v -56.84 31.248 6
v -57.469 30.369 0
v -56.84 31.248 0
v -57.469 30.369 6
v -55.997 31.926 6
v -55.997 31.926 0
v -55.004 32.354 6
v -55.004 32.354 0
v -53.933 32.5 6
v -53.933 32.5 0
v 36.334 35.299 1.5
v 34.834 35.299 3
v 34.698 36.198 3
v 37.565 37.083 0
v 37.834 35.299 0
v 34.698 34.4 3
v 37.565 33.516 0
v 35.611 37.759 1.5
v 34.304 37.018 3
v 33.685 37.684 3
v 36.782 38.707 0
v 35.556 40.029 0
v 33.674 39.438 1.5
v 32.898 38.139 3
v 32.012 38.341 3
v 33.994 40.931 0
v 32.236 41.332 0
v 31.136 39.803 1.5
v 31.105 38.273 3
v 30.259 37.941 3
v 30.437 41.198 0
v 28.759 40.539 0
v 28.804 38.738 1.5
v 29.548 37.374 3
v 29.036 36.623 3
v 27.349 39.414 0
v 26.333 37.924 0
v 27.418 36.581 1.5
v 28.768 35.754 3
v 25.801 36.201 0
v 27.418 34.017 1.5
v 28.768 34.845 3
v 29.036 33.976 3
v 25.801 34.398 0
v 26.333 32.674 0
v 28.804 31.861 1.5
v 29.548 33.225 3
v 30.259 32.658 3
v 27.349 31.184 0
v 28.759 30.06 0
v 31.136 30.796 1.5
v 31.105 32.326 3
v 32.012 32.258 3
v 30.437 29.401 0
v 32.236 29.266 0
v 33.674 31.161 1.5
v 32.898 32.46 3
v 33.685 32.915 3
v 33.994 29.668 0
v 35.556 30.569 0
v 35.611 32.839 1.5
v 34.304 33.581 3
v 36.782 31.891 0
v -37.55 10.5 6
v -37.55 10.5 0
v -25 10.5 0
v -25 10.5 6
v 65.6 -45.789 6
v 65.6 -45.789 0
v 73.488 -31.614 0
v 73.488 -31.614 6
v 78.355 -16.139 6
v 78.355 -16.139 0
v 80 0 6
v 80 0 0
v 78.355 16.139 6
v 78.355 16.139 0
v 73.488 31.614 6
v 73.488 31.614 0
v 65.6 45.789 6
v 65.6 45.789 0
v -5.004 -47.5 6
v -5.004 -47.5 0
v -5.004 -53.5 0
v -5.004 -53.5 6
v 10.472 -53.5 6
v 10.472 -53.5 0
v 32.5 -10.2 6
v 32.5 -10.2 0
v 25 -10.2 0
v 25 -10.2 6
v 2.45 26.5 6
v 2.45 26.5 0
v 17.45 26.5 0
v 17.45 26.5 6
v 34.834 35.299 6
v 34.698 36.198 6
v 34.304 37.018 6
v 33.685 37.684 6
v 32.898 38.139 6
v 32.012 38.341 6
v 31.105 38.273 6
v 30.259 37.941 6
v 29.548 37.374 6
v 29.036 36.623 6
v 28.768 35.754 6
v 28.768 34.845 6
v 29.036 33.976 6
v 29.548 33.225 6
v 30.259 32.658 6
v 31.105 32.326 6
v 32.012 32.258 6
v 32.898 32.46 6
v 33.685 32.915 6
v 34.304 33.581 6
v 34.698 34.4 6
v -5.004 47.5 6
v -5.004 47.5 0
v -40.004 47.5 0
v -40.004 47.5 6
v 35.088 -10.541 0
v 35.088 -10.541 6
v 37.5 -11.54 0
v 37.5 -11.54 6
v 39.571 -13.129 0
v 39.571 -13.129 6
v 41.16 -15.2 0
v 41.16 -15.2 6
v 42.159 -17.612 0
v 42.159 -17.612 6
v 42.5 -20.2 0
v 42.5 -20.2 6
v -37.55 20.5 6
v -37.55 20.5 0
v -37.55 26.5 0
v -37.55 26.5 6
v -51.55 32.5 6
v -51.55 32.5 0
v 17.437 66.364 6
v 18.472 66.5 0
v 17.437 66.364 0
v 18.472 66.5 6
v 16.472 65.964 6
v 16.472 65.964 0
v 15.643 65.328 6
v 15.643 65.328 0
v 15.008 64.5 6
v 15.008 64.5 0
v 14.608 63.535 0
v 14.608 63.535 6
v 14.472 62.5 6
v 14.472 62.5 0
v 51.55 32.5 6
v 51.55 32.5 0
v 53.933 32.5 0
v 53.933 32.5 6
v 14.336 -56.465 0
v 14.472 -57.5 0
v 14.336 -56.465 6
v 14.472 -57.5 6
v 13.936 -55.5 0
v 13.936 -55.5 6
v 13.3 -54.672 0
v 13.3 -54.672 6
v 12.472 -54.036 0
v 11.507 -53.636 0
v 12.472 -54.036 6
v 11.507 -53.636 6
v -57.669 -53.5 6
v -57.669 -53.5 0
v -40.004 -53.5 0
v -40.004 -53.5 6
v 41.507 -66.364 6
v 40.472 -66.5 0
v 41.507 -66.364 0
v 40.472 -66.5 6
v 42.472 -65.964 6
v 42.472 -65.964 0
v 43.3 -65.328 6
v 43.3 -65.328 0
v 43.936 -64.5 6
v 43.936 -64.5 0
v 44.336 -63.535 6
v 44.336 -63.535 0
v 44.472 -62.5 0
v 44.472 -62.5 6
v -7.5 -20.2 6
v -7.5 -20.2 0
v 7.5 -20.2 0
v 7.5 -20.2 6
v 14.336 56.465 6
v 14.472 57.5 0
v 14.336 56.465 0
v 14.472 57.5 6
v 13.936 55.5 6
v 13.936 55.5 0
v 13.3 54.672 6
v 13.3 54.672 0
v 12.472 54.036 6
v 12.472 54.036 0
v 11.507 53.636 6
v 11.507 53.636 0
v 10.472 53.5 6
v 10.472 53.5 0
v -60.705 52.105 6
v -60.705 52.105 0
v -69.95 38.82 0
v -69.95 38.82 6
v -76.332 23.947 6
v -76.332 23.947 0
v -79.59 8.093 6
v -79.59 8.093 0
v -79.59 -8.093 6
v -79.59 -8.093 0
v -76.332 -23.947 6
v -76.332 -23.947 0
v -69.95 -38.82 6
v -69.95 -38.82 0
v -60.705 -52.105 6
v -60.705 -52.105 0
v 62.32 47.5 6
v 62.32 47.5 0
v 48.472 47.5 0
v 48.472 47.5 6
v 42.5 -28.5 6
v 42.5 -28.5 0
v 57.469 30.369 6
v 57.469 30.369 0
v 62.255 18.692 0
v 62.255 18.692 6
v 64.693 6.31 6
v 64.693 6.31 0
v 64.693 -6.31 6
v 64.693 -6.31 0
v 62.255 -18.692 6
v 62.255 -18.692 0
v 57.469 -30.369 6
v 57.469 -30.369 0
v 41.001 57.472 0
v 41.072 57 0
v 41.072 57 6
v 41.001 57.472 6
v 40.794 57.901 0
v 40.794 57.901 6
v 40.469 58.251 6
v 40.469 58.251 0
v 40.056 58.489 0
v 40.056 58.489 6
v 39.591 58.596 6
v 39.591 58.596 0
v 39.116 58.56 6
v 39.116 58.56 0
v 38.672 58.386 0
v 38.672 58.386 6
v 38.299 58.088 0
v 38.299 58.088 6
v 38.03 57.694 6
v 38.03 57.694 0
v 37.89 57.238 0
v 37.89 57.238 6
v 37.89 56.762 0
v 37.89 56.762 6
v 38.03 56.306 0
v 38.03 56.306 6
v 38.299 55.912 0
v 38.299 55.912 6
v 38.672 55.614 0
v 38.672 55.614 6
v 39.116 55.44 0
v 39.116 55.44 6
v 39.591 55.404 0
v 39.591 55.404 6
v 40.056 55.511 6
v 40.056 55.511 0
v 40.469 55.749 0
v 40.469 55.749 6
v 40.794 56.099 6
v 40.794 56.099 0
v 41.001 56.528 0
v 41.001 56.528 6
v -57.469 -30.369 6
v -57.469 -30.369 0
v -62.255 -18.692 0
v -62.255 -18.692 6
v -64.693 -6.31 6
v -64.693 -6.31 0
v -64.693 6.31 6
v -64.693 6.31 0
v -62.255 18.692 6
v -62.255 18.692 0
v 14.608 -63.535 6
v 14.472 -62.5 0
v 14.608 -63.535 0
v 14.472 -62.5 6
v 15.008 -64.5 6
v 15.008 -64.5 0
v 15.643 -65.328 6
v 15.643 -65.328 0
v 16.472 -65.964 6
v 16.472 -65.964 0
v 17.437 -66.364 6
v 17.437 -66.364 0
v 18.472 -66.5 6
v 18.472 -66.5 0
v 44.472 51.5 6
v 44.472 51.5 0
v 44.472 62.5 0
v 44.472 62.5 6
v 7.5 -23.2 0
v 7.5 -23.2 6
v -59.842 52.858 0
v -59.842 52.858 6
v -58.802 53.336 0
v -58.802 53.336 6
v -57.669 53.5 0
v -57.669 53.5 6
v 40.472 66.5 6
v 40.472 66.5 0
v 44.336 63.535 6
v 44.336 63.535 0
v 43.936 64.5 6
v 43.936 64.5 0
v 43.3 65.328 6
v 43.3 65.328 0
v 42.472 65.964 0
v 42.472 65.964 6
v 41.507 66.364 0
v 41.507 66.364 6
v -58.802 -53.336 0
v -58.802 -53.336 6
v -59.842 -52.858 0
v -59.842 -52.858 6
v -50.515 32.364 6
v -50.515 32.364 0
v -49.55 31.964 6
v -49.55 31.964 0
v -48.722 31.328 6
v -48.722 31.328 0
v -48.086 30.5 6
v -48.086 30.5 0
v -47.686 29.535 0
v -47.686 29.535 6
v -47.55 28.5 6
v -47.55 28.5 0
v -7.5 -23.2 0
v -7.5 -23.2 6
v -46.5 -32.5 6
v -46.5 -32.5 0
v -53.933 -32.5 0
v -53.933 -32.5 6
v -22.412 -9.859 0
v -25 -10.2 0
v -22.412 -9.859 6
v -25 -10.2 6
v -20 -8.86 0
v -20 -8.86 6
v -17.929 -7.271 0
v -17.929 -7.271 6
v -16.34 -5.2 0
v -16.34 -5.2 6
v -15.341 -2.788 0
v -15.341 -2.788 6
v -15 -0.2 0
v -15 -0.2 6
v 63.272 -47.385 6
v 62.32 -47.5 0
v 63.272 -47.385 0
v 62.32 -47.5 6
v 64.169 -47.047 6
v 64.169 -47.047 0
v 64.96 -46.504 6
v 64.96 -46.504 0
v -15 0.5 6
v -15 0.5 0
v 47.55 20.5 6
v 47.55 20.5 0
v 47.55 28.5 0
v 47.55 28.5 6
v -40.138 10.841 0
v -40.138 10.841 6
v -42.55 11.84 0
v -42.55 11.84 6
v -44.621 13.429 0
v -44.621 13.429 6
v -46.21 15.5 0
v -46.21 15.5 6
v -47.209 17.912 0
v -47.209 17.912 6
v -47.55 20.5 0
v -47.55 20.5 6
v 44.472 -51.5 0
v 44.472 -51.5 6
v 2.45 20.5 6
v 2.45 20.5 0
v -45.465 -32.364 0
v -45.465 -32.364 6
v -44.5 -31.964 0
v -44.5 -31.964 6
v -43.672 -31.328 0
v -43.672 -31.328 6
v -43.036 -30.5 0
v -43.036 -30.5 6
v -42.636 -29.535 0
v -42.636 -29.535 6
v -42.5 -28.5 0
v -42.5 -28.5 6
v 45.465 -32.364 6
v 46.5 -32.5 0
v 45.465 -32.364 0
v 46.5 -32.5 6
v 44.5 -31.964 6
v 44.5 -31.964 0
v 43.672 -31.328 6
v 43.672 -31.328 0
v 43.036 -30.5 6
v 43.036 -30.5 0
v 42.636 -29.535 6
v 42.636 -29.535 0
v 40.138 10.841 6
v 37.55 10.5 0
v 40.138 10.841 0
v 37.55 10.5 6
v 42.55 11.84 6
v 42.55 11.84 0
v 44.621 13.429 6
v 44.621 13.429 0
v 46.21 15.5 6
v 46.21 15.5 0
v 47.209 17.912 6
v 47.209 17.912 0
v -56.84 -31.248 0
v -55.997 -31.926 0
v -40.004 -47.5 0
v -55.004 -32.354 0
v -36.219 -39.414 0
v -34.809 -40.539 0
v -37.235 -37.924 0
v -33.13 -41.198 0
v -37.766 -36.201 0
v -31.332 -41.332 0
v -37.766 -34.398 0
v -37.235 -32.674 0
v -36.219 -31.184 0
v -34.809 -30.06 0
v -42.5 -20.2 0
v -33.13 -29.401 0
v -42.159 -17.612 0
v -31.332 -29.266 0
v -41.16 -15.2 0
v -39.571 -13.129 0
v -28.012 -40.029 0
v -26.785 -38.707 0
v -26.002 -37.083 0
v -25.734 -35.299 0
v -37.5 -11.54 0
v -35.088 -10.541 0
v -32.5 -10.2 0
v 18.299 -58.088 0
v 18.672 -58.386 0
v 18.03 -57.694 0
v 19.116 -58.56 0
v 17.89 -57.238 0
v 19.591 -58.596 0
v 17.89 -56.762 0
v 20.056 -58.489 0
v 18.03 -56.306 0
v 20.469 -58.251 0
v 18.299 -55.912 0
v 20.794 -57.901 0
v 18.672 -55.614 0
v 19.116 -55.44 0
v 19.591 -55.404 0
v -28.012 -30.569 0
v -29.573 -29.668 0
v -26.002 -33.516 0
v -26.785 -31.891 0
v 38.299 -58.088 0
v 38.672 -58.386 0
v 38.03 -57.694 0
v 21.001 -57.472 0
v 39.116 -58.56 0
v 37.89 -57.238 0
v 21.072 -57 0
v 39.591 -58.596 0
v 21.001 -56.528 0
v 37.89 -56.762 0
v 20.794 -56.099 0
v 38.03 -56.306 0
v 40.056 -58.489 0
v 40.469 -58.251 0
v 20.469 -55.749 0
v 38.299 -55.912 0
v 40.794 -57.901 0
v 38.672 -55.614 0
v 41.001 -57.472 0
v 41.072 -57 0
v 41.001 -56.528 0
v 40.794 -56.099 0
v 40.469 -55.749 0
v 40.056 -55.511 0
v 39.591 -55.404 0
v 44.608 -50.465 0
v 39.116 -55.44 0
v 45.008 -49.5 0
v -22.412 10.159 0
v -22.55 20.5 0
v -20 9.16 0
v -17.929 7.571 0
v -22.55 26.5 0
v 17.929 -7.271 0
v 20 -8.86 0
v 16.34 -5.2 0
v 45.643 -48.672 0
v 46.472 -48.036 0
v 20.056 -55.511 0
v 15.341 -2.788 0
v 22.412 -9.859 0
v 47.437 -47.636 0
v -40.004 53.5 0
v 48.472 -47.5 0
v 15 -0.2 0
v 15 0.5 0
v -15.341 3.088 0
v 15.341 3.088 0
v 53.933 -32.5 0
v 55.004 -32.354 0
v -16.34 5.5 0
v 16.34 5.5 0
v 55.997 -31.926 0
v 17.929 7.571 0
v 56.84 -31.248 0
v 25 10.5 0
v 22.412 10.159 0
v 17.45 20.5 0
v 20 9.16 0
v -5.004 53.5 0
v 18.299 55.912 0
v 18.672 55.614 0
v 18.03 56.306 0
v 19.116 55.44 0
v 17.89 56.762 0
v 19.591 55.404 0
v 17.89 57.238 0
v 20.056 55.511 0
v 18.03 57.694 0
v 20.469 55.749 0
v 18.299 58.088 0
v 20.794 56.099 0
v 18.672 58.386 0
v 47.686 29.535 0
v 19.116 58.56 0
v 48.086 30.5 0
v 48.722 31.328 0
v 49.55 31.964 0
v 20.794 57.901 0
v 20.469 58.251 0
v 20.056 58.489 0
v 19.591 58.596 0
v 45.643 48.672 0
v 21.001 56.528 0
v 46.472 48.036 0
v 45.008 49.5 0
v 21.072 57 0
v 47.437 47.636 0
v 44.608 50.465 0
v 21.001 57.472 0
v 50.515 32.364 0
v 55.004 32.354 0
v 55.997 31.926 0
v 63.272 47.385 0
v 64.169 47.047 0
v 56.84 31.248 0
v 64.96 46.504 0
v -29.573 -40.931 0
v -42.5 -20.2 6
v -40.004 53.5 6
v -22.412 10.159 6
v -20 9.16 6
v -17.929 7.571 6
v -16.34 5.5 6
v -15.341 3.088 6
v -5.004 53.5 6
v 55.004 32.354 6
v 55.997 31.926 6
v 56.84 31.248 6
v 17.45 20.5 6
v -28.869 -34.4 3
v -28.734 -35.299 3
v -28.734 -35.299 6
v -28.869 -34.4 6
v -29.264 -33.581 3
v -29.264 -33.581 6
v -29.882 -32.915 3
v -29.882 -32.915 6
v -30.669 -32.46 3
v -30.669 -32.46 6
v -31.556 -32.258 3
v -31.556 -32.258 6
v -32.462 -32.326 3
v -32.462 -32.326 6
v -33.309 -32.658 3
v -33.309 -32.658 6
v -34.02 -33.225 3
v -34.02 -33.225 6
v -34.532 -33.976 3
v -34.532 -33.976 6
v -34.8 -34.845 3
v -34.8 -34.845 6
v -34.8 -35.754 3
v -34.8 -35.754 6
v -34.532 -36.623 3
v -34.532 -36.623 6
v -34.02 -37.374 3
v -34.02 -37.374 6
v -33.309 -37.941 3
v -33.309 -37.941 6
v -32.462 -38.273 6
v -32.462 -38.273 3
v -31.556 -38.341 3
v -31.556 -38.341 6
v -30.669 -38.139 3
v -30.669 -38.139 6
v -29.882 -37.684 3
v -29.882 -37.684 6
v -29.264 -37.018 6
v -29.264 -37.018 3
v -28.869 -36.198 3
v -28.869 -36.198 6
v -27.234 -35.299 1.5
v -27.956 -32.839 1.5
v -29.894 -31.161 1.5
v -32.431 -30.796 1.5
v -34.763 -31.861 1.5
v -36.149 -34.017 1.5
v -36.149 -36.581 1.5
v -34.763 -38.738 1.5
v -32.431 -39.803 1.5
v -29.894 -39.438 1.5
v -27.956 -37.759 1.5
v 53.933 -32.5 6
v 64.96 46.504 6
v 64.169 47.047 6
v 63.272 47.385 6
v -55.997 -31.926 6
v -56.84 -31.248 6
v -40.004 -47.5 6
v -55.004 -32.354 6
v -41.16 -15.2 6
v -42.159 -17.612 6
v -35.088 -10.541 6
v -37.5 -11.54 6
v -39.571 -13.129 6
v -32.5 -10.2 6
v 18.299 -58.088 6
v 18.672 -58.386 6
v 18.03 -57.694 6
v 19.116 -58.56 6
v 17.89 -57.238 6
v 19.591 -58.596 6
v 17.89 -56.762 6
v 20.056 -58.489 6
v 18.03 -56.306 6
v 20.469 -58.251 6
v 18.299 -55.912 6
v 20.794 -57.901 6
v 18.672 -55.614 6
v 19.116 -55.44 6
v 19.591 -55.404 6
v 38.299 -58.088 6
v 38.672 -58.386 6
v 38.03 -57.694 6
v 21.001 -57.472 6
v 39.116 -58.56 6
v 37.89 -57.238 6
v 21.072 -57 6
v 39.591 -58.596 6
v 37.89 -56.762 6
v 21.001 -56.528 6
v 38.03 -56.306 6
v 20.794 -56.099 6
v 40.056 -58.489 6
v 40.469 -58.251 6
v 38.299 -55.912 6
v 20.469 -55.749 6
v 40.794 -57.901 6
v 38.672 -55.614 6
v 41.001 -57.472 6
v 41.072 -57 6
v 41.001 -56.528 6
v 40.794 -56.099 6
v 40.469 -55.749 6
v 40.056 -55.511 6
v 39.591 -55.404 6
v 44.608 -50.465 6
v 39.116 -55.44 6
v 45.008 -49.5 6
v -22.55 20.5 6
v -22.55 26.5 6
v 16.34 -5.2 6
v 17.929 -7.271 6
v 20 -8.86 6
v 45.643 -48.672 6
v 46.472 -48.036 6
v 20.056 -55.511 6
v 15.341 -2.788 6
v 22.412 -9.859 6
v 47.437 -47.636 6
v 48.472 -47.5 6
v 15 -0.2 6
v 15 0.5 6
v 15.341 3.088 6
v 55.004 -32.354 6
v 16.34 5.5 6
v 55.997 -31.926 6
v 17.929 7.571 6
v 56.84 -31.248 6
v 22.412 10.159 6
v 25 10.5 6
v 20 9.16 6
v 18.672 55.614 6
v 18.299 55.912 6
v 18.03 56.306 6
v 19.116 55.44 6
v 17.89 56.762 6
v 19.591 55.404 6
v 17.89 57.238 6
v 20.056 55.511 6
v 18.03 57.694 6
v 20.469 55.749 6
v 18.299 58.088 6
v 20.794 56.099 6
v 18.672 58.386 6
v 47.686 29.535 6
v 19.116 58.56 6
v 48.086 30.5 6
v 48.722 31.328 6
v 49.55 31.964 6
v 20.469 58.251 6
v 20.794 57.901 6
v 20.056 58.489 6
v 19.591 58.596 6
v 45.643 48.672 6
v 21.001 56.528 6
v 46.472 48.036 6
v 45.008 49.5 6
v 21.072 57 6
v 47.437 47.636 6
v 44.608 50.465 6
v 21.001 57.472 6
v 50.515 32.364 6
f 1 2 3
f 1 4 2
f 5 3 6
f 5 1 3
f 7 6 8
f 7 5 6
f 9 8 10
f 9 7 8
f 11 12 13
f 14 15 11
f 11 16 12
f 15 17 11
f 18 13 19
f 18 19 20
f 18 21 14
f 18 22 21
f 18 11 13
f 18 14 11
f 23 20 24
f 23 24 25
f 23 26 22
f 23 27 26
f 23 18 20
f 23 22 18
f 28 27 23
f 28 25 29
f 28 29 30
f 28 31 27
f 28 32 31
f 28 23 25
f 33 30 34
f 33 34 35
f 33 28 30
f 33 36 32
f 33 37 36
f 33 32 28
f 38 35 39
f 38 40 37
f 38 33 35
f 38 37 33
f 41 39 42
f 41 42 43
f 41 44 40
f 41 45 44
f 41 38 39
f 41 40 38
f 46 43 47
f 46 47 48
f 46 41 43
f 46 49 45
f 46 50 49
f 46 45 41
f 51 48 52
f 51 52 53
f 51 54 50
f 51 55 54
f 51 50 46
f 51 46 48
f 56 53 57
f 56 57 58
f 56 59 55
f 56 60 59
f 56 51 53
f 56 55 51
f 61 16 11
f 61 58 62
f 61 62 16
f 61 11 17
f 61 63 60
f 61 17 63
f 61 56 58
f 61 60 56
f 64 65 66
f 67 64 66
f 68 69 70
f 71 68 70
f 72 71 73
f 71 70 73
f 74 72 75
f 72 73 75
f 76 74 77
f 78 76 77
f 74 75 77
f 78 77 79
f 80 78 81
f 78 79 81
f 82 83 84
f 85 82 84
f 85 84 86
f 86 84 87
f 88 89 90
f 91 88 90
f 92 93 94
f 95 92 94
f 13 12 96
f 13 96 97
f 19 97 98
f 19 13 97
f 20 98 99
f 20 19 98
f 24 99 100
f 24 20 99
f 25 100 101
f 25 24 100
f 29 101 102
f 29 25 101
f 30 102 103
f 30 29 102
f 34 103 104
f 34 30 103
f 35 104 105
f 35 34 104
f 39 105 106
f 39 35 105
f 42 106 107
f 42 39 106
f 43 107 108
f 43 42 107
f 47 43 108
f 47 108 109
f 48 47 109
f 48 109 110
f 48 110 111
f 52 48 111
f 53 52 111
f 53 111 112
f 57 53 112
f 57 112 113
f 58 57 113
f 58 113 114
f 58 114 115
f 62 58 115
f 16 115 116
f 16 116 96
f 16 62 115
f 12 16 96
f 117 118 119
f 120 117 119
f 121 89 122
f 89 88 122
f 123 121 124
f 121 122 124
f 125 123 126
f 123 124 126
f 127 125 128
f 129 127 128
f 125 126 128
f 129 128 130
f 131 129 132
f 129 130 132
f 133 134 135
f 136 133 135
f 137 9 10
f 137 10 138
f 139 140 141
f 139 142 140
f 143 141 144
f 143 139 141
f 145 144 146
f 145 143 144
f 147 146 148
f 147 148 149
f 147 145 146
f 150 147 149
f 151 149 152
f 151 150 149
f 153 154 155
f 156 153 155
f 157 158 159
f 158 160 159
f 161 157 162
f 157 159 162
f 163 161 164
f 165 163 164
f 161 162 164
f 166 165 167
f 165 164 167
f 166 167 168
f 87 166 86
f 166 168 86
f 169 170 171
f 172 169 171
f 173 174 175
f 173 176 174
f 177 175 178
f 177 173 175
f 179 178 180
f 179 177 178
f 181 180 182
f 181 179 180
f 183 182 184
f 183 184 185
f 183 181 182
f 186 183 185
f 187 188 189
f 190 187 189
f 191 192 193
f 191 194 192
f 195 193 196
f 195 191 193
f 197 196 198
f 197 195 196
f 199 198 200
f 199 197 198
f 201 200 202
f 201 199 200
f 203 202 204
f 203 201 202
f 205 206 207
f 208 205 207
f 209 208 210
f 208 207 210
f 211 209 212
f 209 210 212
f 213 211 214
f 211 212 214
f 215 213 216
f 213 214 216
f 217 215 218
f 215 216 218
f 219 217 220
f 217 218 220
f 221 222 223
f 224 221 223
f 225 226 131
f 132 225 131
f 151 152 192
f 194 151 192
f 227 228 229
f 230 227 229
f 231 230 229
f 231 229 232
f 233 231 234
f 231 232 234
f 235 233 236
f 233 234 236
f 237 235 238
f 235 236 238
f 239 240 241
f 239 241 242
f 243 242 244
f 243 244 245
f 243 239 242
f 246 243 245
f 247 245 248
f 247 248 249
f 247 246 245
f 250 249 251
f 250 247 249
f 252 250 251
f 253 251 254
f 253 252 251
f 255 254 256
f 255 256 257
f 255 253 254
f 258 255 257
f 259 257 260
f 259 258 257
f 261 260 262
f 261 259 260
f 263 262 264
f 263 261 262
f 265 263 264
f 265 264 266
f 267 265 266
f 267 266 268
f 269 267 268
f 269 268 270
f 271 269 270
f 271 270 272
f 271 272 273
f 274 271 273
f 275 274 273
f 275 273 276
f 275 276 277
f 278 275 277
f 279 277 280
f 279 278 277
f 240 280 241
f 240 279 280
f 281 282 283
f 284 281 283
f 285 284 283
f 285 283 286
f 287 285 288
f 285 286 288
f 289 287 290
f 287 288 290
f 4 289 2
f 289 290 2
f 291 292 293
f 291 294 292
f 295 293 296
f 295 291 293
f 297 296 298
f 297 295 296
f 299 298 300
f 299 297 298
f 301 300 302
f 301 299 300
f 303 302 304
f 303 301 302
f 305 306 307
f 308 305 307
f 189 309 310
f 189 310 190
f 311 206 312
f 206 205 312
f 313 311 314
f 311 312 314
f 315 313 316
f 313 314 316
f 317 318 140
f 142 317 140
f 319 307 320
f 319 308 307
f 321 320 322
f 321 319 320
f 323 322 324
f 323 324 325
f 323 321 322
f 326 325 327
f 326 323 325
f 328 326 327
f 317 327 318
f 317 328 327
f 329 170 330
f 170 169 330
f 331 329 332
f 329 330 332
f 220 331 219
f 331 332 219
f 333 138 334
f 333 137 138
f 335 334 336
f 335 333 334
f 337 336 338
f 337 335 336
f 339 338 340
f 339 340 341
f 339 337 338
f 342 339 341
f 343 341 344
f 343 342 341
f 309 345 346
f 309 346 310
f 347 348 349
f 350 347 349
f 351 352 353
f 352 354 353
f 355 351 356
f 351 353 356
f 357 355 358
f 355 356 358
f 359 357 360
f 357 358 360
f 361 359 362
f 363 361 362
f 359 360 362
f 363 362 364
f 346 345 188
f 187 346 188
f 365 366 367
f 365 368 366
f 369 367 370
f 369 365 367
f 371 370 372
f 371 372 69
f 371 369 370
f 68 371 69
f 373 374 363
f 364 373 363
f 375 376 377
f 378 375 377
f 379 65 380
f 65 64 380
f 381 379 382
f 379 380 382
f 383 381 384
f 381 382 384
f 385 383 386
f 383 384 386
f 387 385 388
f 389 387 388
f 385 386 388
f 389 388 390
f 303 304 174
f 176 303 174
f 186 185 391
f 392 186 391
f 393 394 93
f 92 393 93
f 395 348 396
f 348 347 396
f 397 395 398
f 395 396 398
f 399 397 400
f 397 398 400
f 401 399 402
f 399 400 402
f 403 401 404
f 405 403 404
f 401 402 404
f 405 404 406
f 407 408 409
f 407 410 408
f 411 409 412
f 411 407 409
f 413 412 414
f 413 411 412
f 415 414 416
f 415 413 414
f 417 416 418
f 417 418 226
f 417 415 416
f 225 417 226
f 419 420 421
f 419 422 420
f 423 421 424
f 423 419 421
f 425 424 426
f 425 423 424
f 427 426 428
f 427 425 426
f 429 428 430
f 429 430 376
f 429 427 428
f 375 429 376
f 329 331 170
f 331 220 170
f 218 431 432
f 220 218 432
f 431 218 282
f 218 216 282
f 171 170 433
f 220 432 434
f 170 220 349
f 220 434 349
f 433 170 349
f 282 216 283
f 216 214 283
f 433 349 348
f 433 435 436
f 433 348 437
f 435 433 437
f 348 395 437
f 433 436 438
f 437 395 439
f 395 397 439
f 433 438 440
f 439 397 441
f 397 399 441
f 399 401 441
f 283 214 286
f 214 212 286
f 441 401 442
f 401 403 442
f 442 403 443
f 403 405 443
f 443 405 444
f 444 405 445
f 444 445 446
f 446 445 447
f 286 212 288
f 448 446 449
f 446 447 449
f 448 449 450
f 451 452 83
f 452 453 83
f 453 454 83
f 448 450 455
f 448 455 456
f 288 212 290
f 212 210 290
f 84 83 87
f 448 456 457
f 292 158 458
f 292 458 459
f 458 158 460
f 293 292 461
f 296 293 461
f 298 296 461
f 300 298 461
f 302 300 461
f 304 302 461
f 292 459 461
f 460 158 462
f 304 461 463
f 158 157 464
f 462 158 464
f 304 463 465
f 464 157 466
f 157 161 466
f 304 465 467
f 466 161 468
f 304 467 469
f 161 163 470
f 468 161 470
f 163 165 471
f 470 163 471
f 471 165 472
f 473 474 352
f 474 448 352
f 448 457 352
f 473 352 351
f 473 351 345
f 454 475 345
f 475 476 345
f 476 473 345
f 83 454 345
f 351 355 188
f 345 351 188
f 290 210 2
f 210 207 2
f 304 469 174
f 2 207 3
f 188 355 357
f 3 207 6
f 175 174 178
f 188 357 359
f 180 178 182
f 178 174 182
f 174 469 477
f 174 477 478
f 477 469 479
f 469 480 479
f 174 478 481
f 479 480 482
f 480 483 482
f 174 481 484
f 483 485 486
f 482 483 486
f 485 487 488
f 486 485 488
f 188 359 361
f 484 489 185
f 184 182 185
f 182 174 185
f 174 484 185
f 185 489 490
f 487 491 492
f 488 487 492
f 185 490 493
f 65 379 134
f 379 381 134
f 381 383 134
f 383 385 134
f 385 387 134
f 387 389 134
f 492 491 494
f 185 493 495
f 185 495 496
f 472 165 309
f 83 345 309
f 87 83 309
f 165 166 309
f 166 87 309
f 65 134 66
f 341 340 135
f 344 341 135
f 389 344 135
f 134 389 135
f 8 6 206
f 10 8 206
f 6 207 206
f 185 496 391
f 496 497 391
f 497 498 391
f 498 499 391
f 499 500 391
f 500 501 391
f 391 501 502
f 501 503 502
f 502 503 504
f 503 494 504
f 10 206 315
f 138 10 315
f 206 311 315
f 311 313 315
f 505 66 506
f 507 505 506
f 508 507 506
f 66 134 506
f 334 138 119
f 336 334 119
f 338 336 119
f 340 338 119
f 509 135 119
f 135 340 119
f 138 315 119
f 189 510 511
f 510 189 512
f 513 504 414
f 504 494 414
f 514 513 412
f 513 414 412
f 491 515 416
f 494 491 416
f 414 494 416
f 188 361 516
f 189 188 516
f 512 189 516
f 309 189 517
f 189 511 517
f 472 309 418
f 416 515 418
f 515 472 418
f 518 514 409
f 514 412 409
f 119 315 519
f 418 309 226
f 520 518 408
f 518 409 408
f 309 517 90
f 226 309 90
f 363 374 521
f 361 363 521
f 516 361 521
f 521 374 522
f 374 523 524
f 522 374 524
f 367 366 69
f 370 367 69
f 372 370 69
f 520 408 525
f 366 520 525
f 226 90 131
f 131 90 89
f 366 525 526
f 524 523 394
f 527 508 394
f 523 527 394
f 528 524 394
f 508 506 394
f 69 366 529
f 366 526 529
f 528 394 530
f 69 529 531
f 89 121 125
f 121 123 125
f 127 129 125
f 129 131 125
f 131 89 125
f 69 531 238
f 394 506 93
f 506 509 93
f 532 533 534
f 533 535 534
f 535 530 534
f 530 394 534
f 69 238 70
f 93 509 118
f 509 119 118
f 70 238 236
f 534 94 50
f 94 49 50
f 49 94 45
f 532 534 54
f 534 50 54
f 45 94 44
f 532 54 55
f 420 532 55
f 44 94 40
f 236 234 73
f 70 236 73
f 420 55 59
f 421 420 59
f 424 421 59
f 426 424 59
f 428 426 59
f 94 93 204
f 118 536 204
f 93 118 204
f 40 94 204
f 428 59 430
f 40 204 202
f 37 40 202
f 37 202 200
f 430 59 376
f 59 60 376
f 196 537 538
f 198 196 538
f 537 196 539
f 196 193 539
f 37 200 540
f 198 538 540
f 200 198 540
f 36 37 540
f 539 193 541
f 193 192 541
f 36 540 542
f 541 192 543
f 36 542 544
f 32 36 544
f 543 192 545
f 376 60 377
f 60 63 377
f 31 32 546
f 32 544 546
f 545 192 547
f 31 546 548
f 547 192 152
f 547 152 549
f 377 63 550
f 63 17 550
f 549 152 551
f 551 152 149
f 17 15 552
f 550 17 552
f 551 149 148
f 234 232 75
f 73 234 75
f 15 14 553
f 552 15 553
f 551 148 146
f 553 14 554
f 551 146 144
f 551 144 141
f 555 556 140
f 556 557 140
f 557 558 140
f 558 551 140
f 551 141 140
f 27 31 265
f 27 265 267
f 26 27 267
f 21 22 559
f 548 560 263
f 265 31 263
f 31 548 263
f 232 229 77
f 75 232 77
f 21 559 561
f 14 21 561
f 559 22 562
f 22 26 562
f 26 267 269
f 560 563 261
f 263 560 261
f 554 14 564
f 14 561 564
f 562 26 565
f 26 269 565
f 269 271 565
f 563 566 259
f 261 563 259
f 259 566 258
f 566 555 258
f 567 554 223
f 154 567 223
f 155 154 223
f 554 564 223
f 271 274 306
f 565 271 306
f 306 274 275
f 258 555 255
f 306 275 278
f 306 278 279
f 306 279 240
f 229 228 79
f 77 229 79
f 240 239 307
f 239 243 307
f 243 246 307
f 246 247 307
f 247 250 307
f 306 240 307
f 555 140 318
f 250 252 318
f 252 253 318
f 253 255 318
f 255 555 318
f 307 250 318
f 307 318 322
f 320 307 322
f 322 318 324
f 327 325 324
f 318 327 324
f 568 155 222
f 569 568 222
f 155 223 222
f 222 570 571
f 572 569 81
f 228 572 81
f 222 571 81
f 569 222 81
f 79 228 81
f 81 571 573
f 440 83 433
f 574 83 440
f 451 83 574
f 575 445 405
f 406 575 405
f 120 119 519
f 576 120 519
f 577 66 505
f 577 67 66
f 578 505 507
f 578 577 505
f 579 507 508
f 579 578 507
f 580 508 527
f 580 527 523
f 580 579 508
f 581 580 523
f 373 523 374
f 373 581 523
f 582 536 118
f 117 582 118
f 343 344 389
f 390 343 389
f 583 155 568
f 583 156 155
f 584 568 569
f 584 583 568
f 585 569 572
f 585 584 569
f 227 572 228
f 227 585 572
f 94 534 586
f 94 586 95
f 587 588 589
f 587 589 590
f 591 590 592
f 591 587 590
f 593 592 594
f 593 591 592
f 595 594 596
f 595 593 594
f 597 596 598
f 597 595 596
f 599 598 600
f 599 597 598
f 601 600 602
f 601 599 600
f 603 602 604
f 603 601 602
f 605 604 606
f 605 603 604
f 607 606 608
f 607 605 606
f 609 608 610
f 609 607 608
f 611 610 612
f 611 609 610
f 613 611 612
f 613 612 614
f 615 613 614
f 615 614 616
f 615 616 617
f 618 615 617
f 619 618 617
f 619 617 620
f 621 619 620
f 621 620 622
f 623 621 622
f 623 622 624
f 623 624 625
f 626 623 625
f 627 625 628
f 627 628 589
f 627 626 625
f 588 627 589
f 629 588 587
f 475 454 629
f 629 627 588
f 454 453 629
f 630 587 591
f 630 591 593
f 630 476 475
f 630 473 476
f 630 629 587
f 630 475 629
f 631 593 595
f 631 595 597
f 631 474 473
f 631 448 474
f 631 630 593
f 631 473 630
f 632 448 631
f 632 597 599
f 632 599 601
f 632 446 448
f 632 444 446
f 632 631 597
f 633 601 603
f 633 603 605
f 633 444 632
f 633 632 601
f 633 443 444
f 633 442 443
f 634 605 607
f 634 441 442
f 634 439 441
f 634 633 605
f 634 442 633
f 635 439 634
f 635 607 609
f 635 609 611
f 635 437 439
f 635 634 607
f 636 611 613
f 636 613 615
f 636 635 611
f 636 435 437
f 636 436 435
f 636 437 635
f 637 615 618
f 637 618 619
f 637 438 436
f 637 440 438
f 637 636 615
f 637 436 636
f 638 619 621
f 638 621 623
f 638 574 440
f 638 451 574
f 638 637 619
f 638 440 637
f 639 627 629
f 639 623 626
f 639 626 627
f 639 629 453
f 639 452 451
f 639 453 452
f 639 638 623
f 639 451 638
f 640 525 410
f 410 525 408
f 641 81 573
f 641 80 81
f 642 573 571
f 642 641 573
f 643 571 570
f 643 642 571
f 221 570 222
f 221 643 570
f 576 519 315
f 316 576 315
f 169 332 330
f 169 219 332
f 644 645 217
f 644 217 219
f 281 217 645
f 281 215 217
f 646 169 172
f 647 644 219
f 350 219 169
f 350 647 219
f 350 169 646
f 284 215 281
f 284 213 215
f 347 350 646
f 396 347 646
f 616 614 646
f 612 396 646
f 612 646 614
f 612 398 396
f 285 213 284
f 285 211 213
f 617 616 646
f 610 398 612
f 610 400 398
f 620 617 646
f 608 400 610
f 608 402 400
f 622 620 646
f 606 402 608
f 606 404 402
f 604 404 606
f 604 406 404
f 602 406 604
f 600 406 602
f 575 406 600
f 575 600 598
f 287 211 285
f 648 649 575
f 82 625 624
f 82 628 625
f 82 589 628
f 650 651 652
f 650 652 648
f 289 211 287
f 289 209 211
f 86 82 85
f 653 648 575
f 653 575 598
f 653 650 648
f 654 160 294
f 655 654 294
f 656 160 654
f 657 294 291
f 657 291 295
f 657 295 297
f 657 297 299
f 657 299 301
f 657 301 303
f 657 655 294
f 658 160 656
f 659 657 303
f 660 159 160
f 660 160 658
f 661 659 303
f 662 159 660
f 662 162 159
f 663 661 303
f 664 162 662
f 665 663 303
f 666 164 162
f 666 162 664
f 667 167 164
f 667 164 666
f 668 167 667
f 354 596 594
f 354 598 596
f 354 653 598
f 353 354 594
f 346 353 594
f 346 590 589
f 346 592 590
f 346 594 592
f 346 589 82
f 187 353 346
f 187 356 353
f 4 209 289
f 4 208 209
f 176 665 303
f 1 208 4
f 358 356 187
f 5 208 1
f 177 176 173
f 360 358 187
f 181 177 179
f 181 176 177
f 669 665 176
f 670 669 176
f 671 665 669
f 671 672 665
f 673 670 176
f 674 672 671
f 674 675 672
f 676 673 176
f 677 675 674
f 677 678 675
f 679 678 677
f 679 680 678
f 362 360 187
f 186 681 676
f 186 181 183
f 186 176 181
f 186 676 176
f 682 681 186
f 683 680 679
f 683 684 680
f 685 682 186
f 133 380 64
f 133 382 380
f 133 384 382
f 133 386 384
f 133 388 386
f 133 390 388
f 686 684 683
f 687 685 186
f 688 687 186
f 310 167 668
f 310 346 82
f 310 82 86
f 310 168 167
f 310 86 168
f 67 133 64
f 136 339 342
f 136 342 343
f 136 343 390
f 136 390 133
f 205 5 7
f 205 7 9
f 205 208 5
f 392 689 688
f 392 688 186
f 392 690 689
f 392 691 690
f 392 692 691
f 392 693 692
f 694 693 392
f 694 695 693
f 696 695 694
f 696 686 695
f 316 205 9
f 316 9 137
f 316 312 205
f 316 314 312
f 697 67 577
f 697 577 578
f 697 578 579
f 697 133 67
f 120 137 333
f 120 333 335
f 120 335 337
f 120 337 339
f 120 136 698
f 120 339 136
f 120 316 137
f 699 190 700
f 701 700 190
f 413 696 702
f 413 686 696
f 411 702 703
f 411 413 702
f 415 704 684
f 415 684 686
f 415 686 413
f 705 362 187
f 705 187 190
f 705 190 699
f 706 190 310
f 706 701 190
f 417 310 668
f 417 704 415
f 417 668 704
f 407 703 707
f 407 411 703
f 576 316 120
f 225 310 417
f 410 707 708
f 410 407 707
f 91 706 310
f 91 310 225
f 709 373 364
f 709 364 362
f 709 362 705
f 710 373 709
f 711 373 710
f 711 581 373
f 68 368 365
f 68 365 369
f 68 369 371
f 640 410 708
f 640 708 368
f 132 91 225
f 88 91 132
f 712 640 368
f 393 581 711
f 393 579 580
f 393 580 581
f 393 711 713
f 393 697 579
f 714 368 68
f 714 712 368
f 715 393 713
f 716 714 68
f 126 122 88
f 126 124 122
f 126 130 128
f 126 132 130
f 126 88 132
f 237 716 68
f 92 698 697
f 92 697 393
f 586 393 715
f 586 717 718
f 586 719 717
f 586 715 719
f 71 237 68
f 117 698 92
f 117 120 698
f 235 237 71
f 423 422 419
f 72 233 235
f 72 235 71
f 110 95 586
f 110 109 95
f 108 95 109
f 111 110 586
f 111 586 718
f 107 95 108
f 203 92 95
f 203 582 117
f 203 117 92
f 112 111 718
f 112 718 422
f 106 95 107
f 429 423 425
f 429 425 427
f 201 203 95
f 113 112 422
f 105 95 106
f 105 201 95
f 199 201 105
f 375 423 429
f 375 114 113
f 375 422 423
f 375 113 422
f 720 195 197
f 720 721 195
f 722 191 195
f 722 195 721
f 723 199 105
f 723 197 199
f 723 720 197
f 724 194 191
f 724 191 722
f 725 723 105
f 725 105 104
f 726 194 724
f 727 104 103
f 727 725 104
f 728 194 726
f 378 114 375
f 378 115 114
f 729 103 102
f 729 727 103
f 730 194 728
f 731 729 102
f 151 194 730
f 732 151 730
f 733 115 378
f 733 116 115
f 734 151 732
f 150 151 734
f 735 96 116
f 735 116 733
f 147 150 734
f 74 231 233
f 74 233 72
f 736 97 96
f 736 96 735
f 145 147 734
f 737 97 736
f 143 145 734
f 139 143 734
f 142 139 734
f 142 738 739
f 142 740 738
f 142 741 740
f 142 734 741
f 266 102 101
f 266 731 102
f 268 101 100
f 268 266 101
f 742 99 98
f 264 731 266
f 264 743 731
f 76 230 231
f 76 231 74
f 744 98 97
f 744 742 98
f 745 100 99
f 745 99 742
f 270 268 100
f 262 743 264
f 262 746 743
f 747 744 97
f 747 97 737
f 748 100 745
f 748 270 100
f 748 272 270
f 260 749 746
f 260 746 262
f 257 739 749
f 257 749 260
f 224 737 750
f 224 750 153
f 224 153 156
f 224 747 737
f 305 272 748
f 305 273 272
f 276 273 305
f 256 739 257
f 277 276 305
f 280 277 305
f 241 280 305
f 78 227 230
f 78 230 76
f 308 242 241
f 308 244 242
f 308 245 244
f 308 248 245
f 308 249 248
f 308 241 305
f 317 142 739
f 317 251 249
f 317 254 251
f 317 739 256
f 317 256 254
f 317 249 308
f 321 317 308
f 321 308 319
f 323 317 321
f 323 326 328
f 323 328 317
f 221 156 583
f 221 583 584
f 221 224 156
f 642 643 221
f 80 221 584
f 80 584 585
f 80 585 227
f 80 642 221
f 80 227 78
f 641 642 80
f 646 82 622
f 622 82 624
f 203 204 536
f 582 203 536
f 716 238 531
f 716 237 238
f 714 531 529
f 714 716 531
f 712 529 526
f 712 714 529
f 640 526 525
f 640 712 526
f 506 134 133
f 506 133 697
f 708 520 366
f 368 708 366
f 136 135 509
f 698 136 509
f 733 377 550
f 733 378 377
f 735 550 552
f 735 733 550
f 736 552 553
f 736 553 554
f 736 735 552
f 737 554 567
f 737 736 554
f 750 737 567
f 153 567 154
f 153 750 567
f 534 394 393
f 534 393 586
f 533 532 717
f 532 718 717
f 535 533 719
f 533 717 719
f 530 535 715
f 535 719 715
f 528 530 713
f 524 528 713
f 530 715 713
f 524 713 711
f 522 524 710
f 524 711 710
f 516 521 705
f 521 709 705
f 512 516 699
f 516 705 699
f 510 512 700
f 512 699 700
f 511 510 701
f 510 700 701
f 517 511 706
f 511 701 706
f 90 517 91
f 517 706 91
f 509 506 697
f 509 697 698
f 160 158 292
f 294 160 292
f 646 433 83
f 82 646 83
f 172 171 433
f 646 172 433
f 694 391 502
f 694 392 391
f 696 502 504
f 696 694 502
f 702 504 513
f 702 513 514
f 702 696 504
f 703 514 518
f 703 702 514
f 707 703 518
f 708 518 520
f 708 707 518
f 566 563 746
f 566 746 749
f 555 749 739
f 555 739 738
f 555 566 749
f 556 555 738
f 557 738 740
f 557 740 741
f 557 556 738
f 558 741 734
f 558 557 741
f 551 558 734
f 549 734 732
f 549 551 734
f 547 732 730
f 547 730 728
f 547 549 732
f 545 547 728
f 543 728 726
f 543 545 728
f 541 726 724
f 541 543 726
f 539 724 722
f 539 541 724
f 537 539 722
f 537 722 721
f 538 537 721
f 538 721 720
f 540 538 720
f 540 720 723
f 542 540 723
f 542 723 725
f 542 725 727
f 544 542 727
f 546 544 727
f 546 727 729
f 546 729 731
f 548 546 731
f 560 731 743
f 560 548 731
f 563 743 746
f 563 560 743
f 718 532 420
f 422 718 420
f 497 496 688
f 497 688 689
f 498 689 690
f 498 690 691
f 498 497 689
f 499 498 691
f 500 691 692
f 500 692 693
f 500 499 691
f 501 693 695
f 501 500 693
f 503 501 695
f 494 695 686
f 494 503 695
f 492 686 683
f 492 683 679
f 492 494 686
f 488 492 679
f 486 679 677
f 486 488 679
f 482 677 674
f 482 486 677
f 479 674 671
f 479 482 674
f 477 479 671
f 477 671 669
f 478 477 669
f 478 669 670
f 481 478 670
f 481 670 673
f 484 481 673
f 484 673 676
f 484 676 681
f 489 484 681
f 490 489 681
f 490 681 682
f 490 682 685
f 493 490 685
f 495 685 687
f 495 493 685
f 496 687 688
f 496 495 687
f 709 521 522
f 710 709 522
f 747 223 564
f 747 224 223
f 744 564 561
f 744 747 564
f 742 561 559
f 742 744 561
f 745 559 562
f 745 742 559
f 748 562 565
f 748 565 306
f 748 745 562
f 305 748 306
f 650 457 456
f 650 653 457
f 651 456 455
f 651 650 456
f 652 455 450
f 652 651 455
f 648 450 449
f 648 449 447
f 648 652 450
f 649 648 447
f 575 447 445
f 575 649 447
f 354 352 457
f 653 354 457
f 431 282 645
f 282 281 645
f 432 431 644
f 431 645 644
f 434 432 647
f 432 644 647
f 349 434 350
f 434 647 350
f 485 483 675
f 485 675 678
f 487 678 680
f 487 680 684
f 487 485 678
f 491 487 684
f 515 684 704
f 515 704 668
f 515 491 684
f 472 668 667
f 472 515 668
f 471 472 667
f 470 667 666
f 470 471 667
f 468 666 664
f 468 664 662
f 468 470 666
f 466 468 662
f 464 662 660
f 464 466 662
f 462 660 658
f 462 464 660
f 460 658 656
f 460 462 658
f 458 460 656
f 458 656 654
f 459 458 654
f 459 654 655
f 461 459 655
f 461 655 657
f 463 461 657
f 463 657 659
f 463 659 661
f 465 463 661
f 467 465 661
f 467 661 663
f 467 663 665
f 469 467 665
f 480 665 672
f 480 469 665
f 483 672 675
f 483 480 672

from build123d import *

# Parameters (mm, degrees)
ESBO_O1_R                = 3.05
ESBO_O1_W                = 15
ESBO_O1_H                = 3
ESBO_O1_R_2              = 1.6
ESBO_O1_H_2              = 6
RESSALTO_EXTRUS_O1_DEPTH = 6
CHANFRO1_SIZE            = 3
FILETE1_R                = 4
FILETE2_R                = 10
FILETE3_R                = 10


with BuildPart() as part:
    # Esboço1 → Ressalto-extrusão1 (new body)
    with BuildSketch(Plane.XY):
        with BuildLine():
            Line((14.471901241, -53.5), (14.471901241, -66.5))
            Line((14.471901241, -66.5), (44.471901241, -66.5))
            Line((44.471901241, -66.5), (44.471901241, -47.5))
            Line((44.471901241, -47.5), (64.371965948, -47.5))
            ThreePointArc((64.371965948, -47.5), (80, 0), (64.371965948, 47.5))
            Line((64.371965948, 47.5), (44.471901241, 47.5))
            Line((44.471901241, 47.5), (44.471901241, 66.5))
            Line((44.471901241, 66.5), (14.471901241, 66.5))
            Line((14.471901241, 66.5), (14.471901241, 53.5))
            Line((14.471901241, 53.5), (-5.003543323, 53.5))
            Line((-5.003543323, 53.5), (-5.003543323, 47.5))
            Line((-5.003543323, 47.5), (-40.003543323, 47.5))
            Line((-40.003543323, 47.5), (-40.003543323, 53.5))
            Line((-40.003543323, 53.5), (-59.478987886, 53.5))
            ThreePointArc((-59.478987886, 53.5), (-80, 0), (-59.478987886, -53.5))
            Line((-59.478987886, -53.5), (-40.003543323, -53.5))
            Line((-40.003543323, -53.5), (-40.003543323, -47.5))
            Line((-40.003543323, -47.5), (-5.003543323, -47.5))
            Line((-5.003543323, -47.5), (-5.003543323, -53.5))
            Line((-5.003543323, -53.5), (14.471901241, -53.5))
        make_face()
        with BuildLine():
            Line((-56.291651246, 32.5), (-47.55, 32.5))
            Line((-47.55, 32.5), (-47.55, 10.5))
            Line((-47.55, 10.5), (-15, 10.5))
            Line((-15, 10.5), (-15, -10.2))
            Line((-15, -10.2), (-42.5, -10.2))
            Line((-42.5, -10.2), (-42.5, -32.5))
            Line((-42.5, -32.5), (-56.291651246, -32.5))
            ThreePointArc((-56.291651246, -32.5), (-65, 0), (-56.291651246, 32.5))
        make_face(mode=Mode.SUBTRACT)
        with BuildLine():
            Line((47.55, 32.5), (56.291651246, 32.5))
            ThreePointArc((56.291651246, 32.5), (65, 0), (56.291651246, -32.5))
            Line((56.291651246, -32.5), (42.5, -32.5))
            Line((42.5, -32.5), (42.5, -10.2))
            Line((42.5, -10.2), (15, -10.2))
            Line((15, -10.2), (15, 10.5))
            Line((15, 10.5), (47.55, 10.5))
            Line((47.55, 10.5), (47.55, 32.5))
        make_face(mode=Mode.SUBTRACT)
        with Locations((-31.783703802, -35.29937921)):
            Circle(ESBO_O1_R, mode=Mode.SUBTRACT)
        with Locations((0, -21.7)):
            Rectangle(ESBO_O1_W, ESBO_O1_H, mode=Mode.SUBTRACT)
        with Locations((19.471901241, -57)):
            Circle(ESBO_O1_R_2, mode=Mode.SUBTRACT)
        with Locations((39.471901241, -57)):
            Circle(ESBO_O1_R_2, mode=Mode.SUBTRACT)
        with Locations((-30.05, 23.5)):
            Rectangle(ESBO_O1_W, ESBO_O1_H_2, mode=Mode.SUBTRACT)
        with Locations((9.95, 23.5)):
            Rectangle(ESBO_O1_W, ESBO_O1_H_2, mode=Mode.SUBTRACT)
        with Locations((31.783703802, 35.29937921)):
            Circle(ESBO_O1_R, mode=Mode.SUBTRACT)
        with Locations((19.471901241, 57)):
            Circle(ESBO_O1_R_2, mode=Mode.SUBTRACT)
        with Locations((39.471901241, 57)):
            Circle(ESBO_O1_R_2, mode=Mode.SUBTRACT)
    extrude(amount=RESSALTO_EXTRUS_O1_DEPTH)

    # Chanfro1
    chanfro1_edges = [part.edges().sort_by_distance(p)[0] for p in [
        (-34.833703802, -35.29937921, 0),
        (28.733703802, 35.29937921, 0),
    ]]
    chamfer(chanfro1_edges, length=CHANFRO1_SIZE)

    # Filete1
    filete1_edges = [part.edges().sort_by_distance(p)[0] for p in [
        (-42.5, -32.5, 3),
        (-47.55, 32.5, 3),
        (-56.291651246, 32.5, 3),
        (-56.291651246, -32.5, 3),
        (56.291651246, 32.5, 3),
        (47.55, 32.5, 3),
        (42.5, -32.5, 3),
        (56.291651246, -32.5, 3),
        (44.471901241, -47.5, 3),
        (44.471901241, -66.5, 3),
        (14.471901241, -66.5, 3),
        (14.471901241, -53.5, 3),
        (-59.478987886, -53.5, 3),
        (-59.478987886, 53.5, 3),
        (14.471901241, 53.5, 3),
        (14.471901241, 66.5, 3),
        (44.471901241, 66.5, 3),
        (44.471901241, 47.5, 3),
        (64.371965948, 47.5, 3),
        (64.371965948, -47.5, 3),
    ]]
    fillet(filete1_edges, radius=FILETE1_R)

    # Filete2
    filete2_edges = [part.edges().sort_by_distance(p)[0] for p in [
        (-15, -10.2, 3),
        (-15, 10.5, 3),
        (15, 10.5, 3),
        (15, -10.2, 3),
    ]]
    fillet(filete2_edges, radius=FILETE2_R)

    # Filete3
    filete3_edges = [part.edges().sort_by_distance(p)[0] for p in [
        (-42.5, -10.2, 3),
        (-47.55, 10.5, 3),
        (47.55, 10.5, 3),
        (42.5, -10.2, 3),
    ]]
    fillet(filete3_edges, radius=FILETE3_R)


solid = part.part
